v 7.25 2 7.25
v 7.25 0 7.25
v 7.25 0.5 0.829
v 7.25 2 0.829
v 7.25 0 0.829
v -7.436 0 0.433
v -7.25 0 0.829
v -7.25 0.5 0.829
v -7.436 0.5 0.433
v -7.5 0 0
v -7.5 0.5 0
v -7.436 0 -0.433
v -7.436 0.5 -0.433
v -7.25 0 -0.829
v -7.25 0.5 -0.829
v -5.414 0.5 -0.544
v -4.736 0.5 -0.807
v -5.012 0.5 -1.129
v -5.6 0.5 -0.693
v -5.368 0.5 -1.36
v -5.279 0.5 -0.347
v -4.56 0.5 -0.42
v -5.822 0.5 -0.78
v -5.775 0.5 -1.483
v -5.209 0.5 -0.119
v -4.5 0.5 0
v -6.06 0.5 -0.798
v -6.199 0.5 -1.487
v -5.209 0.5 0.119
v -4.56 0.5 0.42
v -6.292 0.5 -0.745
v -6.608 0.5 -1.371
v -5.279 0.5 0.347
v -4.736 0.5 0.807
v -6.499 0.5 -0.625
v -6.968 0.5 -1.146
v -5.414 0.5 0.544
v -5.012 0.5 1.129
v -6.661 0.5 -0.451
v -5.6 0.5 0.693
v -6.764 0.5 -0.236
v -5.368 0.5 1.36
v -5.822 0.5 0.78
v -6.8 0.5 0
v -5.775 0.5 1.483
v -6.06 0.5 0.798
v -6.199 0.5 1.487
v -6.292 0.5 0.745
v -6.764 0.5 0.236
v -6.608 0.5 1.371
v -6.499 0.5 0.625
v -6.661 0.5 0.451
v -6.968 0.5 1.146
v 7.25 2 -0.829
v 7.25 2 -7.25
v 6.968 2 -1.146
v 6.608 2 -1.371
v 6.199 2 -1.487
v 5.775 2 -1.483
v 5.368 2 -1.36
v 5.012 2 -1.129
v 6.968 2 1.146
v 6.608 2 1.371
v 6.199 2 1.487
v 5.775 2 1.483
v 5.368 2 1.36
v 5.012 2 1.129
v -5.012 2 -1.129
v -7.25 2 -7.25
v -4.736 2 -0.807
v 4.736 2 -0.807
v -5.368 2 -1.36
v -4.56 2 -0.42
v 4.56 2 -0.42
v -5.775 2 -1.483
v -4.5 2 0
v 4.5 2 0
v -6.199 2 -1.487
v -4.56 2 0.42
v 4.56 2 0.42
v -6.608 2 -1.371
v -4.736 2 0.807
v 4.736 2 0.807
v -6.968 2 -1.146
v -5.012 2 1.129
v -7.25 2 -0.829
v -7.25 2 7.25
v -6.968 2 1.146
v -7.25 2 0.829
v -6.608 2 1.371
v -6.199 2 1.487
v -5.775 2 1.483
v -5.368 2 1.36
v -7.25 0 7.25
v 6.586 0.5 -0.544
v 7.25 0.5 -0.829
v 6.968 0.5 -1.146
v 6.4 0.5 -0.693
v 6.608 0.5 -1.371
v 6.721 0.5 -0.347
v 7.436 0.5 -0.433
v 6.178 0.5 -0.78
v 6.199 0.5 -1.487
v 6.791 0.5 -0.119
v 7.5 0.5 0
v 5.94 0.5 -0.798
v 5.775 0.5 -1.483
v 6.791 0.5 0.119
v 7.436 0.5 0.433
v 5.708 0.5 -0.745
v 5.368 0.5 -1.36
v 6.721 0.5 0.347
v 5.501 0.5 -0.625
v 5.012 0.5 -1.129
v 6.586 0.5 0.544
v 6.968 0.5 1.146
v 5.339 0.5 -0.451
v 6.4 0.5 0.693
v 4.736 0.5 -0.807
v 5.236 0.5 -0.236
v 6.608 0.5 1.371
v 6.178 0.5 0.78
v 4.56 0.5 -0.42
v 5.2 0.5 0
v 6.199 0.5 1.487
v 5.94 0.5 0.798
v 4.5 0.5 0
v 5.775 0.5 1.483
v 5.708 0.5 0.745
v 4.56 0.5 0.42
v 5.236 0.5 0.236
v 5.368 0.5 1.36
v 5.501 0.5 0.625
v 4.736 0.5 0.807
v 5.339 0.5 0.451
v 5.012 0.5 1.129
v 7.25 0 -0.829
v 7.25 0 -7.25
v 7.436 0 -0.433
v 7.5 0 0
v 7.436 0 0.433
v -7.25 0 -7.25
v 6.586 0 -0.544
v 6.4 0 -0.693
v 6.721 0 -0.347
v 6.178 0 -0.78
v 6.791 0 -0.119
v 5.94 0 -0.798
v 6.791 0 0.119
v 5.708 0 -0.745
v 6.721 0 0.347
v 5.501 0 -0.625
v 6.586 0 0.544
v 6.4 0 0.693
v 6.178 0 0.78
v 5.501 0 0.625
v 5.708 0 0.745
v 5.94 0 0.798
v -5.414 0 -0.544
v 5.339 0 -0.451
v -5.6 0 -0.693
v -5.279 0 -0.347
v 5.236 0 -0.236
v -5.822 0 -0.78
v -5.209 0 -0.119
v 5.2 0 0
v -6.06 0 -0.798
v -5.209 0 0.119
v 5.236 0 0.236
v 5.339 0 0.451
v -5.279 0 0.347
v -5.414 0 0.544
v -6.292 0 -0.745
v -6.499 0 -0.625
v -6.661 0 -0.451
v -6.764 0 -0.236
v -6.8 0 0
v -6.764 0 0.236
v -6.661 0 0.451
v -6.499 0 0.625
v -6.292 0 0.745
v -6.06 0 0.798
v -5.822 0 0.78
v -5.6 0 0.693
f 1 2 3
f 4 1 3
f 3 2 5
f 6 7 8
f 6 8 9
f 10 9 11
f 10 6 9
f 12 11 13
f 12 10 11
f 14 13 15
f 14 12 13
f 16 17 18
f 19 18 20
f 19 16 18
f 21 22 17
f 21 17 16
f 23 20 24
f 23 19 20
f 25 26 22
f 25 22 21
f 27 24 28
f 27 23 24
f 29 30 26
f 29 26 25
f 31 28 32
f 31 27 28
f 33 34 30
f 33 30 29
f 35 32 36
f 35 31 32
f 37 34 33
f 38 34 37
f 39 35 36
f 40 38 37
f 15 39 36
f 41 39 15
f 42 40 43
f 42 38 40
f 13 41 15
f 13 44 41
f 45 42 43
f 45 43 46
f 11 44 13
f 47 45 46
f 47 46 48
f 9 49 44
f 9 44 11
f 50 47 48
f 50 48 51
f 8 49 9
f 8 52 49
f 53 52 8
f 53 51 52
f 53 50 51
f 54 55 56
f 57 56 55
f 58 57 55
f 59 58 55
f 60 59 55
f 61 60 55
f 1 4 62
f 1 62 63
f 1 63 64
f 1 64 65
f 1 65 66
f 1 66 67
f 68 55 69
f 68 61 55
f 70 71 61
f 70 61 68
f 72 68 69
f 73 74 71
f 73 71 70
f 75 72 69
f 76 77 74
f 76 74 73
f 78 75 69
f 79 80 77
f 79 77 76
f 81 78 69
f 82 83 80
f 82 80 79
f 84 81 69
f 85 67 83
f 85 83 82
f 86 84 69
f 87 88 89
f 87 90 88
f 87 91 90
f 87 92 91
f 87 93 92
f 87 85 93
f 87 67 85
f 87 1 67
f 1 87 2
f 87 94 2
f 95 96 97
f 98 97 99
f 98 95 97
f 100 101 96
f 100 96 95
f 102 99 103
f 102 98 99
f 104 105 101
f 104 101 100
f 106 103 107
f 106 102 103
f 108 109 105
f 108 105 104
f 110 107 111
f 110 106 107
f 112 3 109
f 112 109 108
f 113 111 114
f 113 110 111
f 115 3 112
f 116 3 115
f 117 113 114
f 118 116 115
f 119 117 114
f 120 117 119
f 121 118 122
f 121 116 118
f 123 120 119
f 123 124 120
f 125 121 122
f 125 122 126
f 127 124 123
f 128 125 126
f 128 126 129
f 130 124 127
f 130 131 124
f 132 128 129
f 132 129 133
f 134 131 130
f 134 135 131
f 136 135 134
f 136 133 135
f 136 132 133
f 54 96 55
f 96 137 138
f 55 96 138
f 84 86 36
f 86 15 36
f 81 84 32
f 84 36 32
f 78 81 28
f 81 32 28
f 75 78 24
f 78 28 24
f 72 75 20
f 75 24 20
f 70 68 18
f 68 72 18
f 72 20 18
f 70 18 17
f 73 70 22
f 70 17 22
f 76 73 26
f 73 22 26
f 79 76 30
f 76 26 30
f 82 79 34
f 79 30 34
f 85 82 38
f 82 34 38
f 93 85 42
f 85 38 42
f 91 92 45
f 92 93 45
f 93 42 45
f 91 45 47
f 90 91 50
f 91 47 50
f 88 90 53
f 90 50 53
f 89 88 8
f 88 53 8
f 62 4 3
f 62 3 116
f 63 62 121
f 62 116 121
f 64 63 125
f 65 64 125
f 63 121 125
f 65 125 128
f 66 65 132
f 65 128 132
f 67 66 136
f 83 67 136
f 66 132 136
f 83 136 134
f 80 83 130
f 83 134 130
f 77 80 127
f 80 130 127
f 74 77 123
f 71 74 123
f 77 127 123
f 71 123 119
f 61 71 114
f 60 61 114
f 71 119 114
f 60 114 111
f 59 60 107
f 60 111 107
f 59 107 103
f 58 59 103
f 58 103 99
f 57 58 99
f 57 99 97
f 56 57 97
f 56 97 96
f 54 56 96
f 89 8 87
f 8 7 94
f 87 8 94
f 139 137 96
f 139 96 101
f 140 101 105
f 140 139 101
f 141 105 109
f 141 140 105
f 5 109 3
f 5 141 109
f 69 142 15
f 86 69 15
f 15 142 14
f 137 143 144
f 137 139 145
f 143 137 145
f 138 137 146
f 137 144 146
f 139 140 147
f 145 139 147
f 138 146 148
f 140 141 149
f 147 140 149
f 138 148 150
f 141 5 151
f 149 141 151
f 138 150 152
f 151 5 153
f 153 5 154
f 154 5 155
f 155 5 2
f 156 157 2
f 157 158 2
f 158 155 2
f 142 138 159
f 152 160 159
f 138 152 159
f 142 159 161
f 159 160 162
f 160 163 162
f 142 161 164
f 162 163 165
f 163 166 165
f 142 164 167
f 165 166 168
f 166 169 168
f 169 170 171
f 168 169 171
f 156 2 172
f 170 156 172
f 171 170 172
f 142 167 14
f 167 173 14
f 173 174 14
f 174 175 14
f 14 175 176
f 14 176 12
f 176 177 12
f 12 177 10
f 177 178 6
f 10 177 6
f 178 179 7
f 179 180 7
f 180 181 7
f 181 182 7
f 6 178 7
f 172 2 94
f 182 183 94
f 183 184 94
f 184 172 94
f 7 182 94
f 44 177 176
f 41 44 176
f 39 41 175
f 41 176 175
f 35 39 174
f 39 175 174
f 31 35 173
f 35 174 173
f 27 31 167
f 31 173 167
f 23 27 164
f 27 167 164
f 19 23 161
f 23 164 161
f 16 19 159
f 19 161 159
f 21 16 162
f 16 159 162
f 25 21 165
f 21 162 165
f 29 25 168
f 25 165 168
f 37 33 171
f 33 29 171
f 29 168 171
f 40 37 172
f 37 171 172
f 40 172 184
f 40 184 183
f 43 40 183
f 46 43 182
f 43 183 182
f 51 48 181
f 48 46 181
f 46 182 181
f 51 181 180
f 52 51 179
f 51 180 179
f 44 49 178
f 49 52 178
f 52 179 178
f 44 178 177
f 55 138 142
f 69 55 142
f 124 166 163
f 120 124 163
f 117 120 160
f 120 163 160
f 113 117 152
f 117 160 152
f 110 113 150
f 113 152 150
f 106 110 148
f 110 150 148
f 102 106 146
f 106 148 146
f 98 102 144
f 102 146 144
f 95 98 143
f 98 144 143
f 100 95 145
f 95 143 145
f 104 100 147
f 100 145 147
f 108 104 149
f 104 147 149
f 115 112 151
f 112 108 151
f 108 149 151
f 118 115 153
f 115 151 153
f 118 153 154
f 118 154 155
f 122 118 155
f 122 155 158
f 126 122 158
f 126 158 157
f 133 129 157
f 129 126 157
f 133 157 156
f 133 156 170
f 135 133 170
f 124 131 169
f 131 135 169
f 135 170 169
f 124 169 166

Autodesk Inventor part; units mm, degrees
ref_plane "YZ Plane" through (0, 0, 0) normal (1, 0, 0) x (0, 1, 0)
ref_plane "XZ Plane" through (0, 0, 0) normal (0, 1, 0) x (-1, 0, 0)
ref_plane "XY Plane" through (0, 0, 0) normal (0, 0, 1) x (1, 0, 0)
sketch "Sketch1" plane through (0, 0, 0) normal (0, 1, 0) x (-1, 0, 0)
  line L0 (7.25, 7.25) -> (-7.25, 7.25)
  line L1 (-7.25, 7.25) -> (-7.25, -7.25)
  line L2 (-7.25, -7.25) -> (7.25, -7.25)
  line L3 (7.25, -7.25) -> (7.25, 7.25)
  circle A0 centre (6, 0) radius 0.8
  circle A1 centre (-6, 0) radius 0.8
  circle A2 centre (6, 0) radius 1.5
  circle A3 centre (-6, 0) radius 1.5
  point P0 (0, 0)
  point P1 (7.25, 0)
  point P2 (0, -7.25)
  dimension "d0" = 14.5
  dimension "d1" = 1.6
  dimension "d3" = 3
  dimension "d4" = 6
  dimension "d5" = 6
extrude "Extrusion1" add sketch "Sketch1" along normal blind 2 contours L3 A2 L2 L1 A3 L0
extrude "Extrusion2" add sketch "Sketch1" along normal blind 0.5 contours A2 L3 | L3 A2 | A3 L1 | L1 A3
properties part number "temp apd reinforcement"
